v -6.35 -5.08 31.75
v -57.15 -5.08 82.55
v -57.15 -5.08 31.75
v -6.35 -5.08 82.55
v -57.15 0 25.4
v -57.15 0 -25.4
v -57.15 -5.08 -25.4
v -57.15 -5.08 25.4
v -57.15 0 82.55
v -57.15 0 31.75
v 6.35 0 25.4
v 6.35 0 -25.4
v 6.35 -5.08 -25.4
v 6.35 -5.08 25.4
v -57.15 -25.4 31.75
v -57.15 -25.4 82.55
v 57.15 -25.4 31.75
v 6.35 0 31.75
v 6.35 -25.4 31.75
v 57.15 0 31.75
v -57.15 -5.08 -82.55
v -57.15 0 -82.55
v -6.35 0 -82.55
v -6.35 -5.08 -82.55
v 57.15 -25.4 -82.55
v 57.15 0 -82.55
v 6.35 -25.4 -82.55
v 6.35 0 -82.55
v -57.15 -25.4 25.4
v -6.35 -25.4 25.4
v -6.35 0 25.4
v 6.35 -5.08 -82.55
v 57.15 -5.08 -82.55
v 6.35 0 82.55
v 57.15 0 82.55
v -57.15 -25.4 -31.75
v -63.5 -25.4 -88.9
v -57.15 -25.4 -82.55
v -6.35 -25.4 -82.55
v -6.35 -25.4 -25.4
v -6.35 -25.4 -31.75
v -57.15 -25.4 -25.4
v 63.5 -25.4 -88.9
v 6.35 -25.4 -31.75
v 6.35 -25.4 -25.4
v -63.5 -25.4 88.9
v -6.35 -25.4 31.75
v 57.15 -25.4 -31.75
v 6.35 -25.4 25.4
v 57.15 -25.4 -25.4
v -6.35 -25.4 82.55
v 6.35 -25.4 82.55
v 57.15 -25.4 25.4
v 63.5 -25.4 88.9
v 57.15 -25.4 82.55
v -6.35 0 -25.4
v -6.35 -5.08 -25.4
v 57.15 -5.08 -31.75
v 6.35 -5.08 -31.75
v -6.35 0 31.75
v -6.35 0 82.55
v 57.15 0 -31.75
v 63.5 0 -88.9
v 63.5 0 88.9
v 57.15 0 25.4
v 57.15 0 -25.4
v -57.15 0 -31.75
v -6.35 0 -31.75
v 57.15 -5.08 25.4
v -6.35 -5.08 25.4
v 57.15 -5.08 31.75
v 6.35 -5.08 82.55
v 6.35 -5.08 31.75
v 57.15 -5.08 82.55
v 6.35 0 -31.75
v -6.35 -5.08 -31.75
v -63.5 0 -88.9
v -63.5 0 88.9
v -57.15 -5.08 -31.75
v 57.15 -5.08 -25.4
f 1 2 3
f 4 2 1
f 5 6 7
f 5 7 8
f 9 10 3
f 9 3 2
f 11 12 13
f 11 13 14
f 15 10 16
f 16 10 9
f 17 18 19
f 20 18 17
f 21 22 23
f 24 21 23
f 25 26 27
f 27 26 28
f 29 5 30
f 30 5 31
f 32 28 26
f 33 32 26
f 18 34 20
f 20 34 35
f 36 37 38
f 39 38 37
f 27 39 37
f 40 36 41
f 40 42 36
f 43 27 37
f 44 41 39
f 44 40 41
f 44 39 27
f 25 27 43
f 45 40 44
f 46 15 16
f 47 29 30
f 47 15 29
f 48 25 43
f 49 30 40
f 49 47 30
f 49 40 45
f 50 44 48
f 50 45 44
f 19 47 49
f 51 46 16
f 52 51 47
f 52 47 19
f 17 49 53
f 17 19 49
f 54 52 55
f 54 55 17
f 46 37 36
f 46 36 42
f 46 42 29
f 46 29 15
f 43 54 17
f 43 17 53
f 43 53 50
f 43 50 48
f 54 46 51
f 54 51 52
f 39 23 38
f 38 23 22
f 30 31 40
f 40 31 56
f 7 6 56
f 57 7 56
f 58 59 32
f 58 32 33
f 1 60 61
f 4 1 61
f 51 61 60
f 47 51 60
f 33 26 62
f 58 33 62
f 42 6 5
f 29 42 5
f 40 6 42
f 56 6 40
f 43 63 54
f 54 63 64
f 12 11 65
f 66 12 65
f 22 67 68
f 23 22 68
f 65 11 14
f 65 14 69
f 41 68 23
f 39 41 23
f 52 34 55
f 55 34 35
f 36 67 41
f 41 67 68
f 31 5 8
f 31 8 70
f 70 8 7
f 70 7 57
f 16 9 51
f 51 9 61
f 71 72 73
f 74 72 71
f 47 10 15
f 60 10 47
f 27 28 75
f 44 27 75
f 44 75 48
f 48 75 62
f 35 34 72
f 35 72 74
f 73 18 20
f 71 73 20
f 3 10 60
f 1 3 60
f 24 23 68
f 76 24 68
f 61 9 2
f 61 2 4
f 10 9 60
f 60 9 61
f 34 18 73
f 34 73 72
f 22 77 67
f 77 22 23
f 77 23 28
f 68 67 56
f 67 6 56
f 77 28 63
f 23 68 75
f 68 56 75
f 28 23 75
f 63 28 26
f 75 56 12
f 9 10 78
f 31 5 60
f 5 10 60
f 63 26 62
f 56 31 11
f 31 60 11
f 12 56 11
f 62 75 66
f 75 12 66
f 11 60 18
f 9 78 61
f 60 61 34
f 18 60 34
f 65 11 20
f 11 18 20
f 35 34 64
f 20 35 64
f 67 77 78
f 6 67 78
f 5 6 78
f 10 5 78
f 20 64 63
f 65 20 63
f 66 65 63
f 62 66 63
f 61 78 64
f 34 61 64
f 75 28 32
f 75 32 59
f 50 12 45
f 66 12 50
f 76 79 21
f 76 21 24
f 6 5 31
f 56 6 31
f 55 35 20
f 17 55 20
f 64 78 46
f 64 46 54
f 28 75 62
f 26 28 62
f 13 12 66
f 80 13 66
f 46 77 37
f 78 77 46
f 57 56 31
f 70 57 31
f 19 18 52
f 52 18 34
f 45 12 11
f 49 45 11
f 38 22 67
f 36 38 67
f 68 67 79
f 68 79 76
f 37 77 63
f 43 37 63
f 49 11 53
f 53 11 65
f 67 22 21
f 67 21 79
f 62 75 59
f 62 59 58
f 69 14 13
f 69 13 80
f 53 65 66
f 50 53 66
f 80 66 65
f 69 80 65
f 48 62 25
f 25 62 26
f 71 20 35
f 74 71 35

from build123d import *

# Parameters (mm, degrees)
F0_W     = 127
F0_H     = 177.8
F0_W_2   = 50.8
F0_H_2   = 6.35
F1_DEPTH = 25.4
F0_H_3   = 50.8
F2_DEPTH = 5.08


with BuildPart() as f1:
    # F0 (on Front) → F1 (new body)
    with BuildSketch(Plane.XZ):
        Rectangle(F0_W, F0_H)
        Polygon((-57.15, 31.75), (-57.15, 82.55), (-6.35, 82.55), (6.35, 82.55), (57.15, 82.55), (57.15, 31.75), (57.15, 25.4), (57.15, -25.4), (57.15, -31.75), (57.15, -82.55), (6.35, -82.55), (-6.35, -82.55), (-57.15, -82.55), (-57.15, -31.75), (-57.15, -25.4), (-57.15, 25.4), align=None, mode=Mode.SUBTRACT)
        with Locations((-31.75, 28.575)):
            Rectangle(F0_W_2, F0_H_2)
        with Locations((31.75, 28.575)):
            Rectangle(F0_W_2, F0_H_2)
        Polygon((6.35, 82.55), (-6.35, 82.55), (-6.35, 31.75), (-6.35, 25.4), (-6.35, -25.4), (-6.35, -31.75), (-6.35, -82.55), (6.35, -82.55), (6.35, -31.75), (6.35, -25.4), (6.35, 25.4), (6.35, 31.75), align=None)
        with Locations((31.75, -28.575)):
            Rectangle(F0_W_2, F0_H_2)
        with Locations((-31.75, -28.575)):
            Rectangle(F0_W_2, F0_H_2)
    extrude(amount=F1_DEPTH)


with BuildPart() as f2:
    # F0 (on Front) → F2 (new body)
    with BuildSketch(Plane.XZ):
        with Locations((-31.75, 57.15)):
            Rectangle(F0_W_2, F0_H_3)
    extrude(amount=F2_DEPTH)


with BuildPart() as f2b:
    # F0 (on Front) → F2, piece 2 (new body)
    with BuildSketch(Plane.XZ):
        with Locations((31.75, 57.15)):
            Rectangle(F0_W_2, F0_H_3)
    extrude(amount=F2_DEPTH)


with BuildPart() as f2c:
    # F0 (on Front) → F2, piece 3 (new body)
    with BuildSketch(Plane.XZ):
        with Locations((31.75, 0)):
            Rectangle(F0_W_2, F0_H_3)
    extrude(amount=F2_DEPTH)


with BuildPart() as f2d:
    # F0 (on Front) → F2, piece 4 (new body)
    with BuildSketch(Plane.XZ):
        with Locations((-31.75, 0)):
            Rectangle(F0_W_2, F0_H_3)
    extrude(amount=F2_DEPTH)


with BuildPart() as f2e:
    # F0 (on Front) → F2, piece 5 (new body)
    with BuildSketch(Plane.XZ):
        with Locations((-31.75, -57.15)):
            Rectangle(F0_W_2, F0_H_3)
    extrude(amount=F2_DEPTH)


with BuildPart() as f2f:
    # F0 (on Front) → F2, piece 6 (new body)
    with BuildSketch(Plane.XZ):
        with Locations((31.75, -57.15)):
            Rectangle(F0_W_2, F0_H_3)
    extrude(amount=F2_DEPTH)


solid = Compound([f1.part, f2.part, f2b.part, f2c.part, f2d.part, f2e.part, f2f.part])
